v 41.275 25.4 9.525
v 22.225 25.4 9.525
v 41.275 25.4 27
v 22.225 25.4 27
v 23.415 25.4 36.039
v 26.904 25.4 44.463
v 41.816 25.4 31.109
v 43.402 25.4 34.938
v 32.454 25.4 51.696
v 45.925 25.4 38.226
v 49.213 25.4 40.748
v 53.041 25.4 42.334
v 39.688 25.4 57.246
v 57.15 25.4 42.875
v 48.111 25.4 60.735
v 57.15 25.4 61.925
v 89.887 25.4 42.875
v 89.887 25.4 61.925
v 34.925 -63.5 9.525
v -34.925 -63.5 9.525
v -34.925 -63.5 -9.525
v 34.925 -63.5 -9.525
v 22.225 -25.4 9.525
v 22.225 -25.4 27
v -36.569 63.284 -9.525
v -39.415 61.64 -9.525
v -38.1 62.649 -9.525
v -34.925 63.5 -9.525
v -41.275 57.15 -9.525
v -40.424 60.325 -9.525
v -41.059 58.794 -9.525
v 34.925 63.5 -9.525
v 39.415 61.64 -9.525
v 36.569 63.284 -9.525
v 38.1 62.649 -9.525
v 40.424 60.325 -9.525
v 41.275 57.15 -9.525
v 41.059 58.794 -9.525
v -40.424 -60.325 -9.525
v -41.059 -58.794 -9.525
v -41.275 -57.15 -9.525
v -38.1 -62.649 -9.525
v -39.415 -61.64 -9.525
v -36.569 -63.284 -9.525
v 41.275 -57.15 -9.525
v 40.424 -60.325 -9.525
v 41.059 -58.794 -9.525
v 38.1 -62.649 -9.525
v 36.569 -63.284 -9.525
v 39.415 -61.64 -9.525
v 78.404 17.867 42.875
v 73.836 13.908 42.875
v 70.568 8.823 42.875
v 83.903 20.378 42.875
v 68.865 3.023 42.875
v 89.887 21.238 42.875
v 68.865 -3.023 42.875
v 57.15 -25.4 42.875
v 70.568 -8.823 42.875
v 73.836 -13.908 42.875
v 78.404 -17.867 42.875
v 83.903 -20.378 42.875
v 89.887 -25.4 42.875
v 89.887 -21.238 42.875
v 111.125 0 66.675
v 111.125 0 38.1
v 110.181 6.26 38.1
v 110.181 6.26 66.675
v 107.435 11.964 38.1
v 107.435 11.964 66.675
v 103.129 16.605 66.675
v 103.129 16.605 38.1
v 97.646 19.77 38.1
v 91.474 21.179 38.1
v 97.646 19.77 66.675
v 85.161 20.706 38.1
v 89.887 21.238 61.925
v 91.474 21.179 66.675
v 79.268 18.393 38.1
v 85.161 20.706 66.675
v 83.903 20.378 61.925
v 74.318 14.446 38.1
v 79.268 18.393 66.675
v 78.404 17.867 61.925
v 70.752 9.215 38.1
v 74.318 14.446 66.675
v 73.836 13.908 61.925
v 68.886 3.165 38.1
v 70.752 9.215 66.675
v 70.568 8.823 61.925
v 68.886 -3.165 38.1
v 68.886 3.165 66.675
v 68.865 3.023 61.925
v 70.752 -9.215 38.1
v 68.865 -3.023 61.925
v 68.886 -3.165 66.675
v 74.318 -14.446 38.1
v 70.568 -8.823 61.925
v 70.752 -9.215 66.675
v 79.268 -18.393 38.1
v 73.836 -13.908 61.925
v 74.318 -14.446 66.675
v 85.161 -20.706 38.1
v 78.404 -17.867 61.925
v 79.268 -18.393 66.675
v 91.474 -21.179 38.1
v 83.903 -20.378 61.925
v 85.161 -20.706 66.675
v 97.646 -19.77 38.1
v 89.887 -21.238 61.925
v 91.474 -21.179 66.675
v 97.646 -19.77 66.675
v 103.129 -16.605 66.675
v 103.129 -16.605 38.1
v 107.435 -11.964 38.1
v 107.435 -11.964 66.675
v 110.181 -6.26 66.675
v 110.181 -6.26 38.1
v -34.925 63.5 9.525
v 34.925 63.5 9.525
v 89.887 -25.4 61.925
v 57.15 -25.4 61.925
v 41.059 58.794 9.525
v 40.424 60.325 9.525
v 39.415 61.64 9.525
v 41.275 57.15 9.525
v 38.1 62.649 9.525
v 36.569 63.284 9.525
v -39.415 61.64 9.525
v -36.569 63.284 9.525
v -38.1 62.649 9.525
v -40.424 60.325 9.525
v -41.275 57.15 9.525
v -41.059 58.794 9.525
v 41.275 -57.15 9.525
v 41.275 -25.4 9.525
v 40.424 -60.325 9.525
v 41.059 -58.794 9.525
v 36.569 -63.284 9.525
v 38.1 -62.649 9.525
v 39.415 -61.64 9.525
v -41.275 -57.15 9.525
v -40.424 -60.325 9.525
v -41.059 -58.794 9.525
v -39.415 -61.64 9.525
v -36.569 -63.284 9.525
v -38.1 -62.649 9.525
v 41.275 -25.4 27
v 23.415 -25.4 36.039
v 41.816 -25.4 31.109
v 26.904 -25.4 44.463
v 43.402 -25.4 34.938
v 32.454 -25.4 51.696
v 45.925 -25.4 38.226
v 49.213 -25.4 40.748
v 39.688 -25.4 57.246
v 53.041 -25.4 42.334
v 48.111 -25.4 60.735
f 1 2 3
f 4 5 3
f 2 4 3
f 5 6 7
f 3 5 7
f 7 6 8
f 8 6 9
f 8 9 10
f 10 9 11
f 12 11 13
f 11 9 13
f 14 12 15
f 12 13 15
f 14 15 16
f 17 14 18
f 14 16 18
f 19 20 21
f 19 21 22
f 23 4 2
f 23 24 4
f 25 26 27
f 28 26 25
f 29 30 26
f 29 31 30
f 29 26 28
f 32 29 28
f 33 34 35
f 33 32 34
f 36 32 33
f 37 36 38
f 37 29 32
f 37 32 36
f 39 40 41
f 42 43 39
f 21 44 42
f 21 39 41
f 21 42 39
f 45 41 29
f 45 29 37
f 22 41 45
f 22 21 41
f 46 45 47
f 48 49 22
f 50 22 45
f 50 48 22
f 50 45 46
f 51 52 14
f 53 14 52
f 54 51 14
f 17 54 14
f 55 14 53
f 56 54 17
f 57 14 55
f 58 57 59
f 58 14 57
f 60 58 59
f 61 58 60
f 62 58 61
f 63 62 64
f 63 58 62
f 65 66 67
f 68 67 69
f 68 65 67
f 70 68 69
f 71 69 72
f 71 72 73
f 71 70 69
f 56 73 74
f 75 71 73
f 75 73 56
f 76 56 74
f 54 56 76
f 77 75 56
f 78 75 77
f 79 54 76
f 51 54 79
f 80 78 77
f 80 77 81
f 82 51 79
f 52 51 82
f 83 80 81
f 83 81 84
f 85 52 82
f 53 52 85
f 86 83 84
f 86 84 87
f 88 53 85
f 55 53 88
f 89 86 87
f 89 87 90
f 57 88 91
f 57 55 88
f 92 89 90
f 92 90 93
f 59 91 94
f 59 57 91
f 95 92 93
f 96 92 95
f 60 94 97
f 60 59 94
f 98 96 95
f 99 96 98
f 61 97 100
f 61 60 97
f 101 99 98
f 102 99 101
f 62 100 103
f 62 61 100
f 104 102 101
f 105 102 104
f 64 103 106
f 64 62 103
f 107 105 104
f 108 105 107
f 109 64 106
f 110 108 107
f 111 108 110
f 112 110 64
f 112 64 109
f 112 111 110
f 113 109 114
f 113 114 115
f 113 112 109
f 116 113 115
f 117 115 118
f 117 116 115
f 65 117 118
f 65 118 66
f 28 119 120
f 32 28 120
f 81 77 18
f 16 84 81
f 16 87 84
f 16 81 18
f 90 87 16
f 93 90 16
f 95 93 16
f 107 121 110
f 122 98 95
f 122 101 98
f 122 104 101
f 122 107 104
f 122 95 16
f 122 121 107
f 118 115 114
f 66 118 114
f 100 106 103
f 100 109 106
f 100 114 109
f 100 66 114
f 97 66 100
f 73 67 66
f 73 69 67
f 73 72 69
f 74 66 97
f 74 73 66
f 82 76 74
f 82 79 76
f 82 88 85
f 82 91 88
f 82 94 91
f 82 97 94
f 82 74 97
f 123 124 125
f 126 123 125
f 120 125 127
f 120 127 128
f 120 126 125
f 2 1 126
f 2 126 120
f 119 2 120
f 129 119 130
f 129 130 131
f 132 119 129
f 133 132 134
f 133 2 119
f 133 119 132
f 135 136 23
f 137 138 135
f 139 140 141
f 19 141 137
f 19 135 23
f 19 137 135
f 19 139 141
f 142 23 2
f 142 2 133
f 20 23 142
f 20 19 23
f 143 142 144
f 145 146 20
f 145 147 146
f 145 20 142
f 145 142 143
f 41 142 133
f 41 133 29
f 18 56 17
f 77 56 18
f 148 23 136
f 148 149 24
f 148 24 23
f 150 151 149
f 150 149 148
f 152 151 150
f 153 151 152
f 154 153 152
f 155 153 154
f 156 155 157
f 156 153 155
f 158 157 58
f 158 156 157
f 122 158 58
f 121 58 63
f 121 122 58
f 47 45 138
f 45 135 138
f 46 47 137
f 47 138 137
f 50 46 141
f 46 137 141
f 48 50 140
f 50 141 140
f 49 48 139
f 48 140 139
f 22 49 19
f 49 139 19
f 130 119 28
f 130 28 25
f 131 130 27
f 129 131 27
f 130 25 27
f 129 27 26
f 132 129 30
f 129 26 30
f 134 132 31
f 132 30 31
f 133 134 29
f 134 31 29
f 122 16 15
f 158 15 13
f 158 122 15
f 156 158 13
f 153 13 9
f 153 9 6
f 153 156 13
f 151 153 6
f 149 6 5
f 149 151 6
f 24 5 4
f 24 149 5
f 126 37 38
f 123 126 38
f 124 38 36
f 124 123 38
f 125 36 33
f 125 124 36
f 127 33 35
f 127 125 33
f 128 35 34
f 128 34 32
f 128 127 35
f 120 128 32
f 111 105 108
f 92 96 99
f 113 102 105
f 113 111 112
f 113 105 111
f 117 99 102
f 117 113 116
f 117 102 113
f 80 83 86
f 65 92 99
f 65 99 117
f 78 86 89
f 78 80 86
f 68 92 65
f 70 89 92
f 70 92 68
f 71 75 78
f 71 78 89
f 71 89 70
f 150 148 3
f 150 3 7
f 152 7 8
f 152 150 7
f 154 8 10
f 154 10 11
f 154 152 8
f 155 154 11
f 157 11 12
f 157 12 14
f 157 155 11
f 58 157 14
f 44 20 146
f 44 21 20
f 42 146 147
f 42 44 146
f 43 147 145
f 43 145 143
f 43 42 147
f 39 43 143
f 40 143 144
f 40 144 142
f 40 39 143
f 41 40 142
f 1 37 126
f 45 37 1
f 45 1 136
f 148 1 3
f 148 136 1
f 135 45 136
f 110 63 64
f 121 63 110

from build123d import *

# Parameters (mm, degrees)
F1_DEPTH = 63.5
F0_W     = 29.5617593795
F0_H     = 19.05
F2_DEPTH = 25.4
F5_R     = 6.35


# Not quite as in the source:
# - a feature of the source that left no trace in its solid (it failed there, or was rolled back) is left out


with BuildPart() as f1:
    # F0 (on Front) → F1 (new body, symmetric)
    with BuildSketch(Plane.XZ):
        Polygon((41.275, -9.525), (41.275, 9.525), (22.225, 9.525), (-41.275, 9.525), (-41.275, -9.525), align=None)
    extrude(amount=F1_DEPTH, both=True)

    # F0 (on Front) → F2 (join, symmetric)
    with BuildSketch(Plane.XZ):
        with BuildLine():
            Line((22.225, 9.525), (41.275, 9.525))
            Line((41.275, 9.525), (41.275, 27.0002))
            ThreePointArc((41.275, 27.0002), (45.9246798487, 38.2255201513), (57.15, 42.8752))
            Line((57.15, 42.8752), (60.325, 42.8752))
            Line((60.325, 42.8752), (60.325, 61.9252))
            Line((60.325, 61.9252), (57.15, 61.9252))
            ThreePointArc((57.15, 61.9252), (32.4542956671, 51.6959043329), (22.225, 27.0002))
            Line((22.225, 27.0002), (22.225, 9.525))
        make_face()
        with Locations((75.1058796897, 52.4002)):
            Rectangle(F0_W, F0_H)
    extrude(amount=F2_DEPTH, both=True)

    # F0 (on Front) → F4 (revolve)
    with BuildSketch(Plane.XZ):
        Polygon((89.8867593795, 61.9252), (89.8867593795, 42.8752), (89.8867593795, 38.1), (111.125, 38.1), (111.125, 66.675), (89.8867593795, 66.675), align=None)
    revolve(axis=Axis((89.8867593795, 0, 52.3875), (0, 0, 1)))

    # F5
    f5_edges = [f1.edges().sort_by_distance(p)[0] for p in [
        (41.275, -63.5, 0),
        (-41.275, -63.5, 0),
        (41.275, 63.5, 0),
        (-41.275, 63.5, 0),
    ]]
    fillet(f5_edges, radius=F5_R)


solid = f1.part
